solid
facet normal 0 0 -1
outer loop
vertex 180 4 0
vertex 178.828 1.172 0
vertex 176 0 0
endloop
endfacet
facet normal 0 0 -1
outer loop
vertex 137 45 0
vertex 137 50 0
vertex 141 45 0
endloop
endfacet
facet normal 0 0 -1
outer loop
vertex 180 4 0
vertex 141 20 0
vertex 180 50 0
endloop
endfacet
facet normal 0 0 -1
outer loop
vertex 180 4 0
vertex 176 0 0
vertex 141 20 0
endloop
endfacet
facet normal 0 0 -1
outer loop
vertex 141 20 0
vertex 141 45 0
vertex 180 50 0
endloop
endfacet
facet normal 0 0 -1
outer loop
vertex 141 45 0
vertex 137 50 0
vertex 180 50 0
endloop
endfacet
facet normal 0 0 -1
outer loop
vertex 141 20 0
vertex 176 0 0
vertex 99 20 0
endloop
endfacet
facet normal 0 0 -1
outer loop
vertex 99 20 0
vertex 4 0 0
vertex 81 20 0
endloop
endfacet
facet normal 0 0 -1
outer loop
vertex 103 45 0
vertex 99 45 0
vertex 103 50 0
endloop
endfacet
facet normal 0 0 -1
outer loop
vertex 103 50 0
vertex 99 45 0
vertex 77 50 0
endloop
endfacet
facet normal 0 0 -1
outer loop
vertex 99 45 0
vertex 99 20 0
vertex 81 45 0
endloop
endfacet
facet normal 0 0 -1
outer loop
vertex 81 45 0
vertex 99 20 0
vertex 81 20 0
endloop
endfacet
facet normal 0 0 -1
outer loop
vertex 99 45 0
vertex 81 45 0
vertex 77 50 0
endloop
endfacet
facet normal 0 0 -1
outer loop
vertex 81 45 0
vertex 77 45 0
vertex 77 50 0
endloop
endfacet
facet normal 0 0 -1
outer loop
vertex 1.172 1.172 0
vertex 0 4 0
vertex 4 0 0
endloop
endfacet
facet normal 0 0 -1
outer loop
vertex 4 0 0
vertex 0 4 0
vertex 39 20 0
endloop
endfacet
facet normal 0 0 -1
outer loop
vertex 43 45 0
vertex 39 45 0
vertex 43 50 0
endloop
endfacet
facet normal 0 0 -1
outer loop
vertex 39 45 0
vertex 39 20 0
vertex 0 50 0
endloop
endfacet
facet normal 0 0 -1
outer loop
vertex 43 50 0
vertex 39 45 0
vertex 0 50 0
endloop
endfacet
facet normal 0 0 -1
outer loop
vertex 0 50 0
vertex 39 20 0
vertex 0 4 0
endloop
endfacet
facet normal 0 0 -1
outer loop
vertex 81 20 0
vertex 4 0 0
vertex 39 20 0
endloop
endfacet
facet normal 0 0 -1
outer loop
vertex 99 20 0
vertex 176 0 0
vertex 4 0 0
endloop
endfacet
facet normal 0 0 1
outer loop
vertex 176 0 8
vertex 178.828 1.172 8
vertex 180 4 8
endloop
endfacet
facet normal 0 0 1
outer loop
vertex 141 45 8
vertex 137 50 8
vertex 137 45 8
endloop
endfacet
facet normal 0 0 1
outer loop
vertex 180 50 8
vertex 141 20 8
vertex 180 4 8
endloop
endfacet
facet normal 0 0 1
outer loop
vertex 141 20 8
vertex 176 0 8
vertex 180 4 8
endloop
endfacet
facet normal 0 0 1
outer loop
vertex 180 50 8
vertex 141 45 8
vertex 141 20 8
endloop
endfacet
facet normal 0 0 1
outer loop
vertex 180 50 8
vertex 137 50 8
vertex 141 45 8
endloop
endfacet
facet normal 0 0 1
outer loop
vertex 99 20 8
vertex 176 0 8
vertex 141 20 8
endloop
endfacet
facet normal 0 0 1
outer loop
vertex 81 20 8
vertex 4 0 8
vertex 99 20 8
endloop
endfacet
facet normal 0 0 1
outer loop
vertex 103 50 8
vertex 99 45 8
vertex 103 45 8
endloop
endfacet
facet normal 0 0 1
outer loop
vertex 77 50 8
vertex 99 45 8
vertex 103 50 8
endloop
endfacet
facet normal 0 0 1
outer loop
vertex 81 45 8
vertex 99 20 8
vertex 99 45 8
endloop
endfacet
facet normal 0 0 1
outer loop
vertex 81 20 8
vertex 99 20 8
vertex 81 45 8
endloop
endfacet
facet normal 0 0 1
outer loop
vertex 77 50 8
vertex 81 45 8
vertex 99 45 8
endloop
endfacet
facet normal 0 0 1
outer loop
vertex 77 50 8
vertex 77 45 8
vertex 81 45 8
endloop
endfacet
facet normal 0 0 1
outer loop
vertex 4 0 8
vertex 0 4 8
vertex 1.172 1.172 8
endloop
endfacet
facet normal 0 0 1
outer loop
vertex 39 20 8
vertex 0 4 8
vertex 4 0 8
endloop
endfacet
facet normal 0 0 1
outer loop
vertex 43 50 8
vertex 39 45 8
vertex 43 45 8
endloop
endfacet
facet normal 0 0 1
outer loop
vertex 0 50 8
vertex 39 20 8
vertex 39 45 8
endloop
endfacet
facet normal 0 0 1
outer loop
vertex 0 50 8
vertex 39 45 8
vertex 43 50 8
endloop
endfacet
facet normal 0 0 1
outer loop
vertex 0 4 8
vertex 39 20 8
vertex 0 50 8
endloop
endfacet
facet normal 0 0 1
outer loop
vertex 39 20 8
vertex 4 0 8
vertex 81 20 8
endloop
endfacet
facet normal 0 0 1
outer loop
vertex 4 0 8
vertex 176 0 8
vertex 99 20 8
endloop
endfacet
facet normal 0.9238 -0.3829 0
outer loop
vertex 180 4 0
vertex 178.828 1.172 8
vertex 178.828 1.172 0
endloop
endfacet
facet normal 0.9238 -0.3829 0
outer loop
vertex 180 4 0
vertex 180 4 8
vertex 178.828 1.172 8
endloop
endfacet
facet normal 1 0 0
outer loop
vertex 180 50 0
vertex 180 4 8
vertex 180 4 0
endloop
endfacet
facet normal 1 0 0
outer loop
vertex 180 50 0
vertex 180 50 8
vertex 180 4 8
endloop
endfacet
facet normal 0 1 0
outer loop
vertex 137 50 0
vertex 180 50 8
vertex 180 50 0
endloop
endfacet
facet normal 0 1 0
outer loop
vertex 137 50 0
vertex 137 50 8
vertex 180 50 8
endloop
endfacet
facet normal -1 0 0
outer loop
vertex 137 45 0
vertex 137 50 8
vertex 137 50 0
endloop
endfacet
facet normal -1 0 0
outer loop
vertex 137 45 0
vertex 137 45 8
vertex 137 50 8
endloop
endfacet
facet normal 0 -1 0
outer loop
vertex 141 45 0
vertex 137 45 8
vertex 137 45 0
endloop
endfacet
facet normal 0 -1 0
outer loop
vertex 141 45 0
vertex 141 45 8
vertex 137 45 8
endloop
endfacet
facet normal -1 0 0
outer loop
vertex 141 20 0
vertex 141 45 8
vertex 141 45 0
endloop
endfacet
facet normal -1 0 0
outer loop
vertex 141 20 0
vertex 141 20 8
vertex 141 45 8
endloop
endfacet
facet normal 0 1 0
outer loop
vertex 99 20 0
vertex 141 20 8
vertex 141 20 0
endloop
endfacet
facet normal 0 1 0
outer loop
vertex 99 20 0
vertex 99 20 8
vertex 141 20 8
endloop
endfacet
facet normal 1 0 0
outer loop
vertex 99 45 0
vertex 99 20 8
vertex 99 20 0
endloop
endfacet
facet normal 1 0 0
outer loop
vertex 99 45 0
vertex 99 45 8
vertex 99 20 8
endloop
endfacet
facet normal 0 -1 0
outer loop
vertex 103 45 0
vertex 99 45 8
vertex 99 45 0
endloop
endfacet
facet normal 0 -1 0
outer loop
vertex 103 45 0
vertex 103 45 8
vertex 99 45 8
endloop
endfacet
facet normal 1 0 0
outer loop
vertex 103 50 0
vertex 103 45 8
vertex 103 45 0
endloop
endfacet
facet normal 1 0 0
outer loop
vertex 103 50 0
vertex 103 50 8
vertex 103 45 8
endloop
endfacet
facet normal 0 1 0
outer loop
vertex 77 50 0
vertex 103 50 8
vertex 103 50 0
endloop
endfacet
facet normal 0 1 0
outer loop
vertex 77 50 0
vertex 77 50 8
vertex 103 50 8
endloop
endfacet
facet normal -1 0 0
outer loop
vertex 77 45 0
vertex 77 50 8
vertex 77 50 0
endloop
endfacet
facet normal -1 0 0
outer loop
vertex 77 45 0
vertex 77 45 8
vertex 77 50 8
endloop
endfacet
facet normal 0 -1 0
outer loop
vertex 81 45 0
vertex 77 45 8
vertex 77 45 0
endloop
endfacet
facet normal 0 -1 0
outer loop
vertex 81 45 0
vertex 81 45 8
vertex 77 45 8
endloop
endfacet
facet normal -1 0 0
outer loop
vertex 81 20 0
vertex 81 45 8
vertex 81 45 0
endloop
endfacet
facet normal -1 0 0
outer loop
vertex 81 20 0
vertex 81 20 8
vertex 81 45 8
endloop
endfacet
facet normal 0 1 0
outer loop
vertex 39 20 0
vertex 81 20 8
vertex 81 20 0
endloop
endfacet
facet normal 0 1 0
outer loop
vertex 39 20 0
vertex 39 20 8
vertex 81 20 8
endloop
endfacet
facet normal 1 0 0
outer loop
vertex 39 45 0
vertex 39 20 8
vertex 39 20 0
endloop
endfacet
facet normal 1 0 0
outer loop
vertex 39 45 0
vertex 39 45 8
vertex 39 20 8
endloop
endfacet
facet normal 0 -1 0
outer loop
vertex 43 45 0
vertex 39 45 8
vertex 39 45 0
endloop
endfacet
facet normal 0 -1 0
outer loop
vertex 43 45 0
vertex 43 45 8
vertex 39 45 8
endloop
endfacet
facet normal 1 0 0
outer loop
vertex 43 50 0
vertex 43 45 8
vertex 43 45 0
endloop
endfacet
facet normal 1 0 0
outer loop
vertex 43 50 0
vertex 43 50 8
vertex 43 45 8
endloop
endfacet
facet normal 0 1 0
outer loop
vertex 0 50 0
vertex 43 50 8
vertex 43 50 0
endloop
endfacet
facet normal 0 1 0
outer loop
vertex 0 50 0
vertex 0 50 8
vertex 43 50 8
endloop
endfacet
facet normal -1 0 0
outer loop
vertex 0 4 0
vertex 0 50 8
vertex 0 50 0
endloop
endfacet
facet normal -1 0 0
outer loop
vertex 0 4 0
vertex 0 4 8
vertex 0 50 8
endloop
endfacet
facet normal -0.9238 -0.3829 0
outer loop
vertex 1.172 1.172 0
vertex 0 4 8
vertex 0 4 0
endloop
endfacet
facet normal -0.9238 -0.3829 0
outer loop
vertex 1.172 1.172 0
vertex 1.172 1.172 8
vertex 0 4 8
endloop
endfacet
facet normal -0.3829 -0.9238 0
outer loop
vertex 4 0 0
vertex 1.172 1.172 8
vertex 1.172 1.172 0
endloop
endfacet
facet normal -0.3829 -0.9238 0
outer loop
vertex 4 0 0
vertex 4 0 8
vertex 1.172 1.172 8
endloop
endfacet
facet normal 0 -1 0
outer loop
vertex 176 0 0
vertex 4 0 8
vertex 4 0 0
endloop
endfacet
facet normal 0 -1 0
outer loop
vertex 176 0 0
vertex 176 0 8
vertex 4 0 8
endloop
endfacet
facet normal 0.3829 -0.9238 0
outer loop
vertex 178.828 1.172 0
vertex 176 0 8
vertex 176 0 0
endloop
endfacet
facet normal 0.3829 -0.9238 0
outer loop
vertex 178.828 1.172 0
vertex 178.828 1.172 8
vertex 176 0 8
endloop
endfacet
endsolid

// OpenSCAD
$fn = 32;

// ----------------------------------------------------------------------
// Oversize slot bar: 180 mm bar with 2 oversize windows
// ----------------------------------------------------------------------

// --- parameters (mm) ---
profile_height = 8;       // extrusion height
profile_points = 24;      // points of the closed outline

profile = [[0, 4], [1.172, 1.172], [4, 0], [176, 0], [178.828, 1.172], [180, 4], [180, 50], [137, 50], [137, 45], [141, 45], [141, 20], [99, 20], [99, 45], [103, 45], [103, 50], [77, 50], [77, 45], [81, 45], [81, 20], [39, 20], [39, 45], [43, 45], [43, 50], [0, 50]];  // single closed polygon, 24 points, counter clockwise

// --- the one profile operation ---
linear_extrude(height = profile_height) polygon(points = profile);
